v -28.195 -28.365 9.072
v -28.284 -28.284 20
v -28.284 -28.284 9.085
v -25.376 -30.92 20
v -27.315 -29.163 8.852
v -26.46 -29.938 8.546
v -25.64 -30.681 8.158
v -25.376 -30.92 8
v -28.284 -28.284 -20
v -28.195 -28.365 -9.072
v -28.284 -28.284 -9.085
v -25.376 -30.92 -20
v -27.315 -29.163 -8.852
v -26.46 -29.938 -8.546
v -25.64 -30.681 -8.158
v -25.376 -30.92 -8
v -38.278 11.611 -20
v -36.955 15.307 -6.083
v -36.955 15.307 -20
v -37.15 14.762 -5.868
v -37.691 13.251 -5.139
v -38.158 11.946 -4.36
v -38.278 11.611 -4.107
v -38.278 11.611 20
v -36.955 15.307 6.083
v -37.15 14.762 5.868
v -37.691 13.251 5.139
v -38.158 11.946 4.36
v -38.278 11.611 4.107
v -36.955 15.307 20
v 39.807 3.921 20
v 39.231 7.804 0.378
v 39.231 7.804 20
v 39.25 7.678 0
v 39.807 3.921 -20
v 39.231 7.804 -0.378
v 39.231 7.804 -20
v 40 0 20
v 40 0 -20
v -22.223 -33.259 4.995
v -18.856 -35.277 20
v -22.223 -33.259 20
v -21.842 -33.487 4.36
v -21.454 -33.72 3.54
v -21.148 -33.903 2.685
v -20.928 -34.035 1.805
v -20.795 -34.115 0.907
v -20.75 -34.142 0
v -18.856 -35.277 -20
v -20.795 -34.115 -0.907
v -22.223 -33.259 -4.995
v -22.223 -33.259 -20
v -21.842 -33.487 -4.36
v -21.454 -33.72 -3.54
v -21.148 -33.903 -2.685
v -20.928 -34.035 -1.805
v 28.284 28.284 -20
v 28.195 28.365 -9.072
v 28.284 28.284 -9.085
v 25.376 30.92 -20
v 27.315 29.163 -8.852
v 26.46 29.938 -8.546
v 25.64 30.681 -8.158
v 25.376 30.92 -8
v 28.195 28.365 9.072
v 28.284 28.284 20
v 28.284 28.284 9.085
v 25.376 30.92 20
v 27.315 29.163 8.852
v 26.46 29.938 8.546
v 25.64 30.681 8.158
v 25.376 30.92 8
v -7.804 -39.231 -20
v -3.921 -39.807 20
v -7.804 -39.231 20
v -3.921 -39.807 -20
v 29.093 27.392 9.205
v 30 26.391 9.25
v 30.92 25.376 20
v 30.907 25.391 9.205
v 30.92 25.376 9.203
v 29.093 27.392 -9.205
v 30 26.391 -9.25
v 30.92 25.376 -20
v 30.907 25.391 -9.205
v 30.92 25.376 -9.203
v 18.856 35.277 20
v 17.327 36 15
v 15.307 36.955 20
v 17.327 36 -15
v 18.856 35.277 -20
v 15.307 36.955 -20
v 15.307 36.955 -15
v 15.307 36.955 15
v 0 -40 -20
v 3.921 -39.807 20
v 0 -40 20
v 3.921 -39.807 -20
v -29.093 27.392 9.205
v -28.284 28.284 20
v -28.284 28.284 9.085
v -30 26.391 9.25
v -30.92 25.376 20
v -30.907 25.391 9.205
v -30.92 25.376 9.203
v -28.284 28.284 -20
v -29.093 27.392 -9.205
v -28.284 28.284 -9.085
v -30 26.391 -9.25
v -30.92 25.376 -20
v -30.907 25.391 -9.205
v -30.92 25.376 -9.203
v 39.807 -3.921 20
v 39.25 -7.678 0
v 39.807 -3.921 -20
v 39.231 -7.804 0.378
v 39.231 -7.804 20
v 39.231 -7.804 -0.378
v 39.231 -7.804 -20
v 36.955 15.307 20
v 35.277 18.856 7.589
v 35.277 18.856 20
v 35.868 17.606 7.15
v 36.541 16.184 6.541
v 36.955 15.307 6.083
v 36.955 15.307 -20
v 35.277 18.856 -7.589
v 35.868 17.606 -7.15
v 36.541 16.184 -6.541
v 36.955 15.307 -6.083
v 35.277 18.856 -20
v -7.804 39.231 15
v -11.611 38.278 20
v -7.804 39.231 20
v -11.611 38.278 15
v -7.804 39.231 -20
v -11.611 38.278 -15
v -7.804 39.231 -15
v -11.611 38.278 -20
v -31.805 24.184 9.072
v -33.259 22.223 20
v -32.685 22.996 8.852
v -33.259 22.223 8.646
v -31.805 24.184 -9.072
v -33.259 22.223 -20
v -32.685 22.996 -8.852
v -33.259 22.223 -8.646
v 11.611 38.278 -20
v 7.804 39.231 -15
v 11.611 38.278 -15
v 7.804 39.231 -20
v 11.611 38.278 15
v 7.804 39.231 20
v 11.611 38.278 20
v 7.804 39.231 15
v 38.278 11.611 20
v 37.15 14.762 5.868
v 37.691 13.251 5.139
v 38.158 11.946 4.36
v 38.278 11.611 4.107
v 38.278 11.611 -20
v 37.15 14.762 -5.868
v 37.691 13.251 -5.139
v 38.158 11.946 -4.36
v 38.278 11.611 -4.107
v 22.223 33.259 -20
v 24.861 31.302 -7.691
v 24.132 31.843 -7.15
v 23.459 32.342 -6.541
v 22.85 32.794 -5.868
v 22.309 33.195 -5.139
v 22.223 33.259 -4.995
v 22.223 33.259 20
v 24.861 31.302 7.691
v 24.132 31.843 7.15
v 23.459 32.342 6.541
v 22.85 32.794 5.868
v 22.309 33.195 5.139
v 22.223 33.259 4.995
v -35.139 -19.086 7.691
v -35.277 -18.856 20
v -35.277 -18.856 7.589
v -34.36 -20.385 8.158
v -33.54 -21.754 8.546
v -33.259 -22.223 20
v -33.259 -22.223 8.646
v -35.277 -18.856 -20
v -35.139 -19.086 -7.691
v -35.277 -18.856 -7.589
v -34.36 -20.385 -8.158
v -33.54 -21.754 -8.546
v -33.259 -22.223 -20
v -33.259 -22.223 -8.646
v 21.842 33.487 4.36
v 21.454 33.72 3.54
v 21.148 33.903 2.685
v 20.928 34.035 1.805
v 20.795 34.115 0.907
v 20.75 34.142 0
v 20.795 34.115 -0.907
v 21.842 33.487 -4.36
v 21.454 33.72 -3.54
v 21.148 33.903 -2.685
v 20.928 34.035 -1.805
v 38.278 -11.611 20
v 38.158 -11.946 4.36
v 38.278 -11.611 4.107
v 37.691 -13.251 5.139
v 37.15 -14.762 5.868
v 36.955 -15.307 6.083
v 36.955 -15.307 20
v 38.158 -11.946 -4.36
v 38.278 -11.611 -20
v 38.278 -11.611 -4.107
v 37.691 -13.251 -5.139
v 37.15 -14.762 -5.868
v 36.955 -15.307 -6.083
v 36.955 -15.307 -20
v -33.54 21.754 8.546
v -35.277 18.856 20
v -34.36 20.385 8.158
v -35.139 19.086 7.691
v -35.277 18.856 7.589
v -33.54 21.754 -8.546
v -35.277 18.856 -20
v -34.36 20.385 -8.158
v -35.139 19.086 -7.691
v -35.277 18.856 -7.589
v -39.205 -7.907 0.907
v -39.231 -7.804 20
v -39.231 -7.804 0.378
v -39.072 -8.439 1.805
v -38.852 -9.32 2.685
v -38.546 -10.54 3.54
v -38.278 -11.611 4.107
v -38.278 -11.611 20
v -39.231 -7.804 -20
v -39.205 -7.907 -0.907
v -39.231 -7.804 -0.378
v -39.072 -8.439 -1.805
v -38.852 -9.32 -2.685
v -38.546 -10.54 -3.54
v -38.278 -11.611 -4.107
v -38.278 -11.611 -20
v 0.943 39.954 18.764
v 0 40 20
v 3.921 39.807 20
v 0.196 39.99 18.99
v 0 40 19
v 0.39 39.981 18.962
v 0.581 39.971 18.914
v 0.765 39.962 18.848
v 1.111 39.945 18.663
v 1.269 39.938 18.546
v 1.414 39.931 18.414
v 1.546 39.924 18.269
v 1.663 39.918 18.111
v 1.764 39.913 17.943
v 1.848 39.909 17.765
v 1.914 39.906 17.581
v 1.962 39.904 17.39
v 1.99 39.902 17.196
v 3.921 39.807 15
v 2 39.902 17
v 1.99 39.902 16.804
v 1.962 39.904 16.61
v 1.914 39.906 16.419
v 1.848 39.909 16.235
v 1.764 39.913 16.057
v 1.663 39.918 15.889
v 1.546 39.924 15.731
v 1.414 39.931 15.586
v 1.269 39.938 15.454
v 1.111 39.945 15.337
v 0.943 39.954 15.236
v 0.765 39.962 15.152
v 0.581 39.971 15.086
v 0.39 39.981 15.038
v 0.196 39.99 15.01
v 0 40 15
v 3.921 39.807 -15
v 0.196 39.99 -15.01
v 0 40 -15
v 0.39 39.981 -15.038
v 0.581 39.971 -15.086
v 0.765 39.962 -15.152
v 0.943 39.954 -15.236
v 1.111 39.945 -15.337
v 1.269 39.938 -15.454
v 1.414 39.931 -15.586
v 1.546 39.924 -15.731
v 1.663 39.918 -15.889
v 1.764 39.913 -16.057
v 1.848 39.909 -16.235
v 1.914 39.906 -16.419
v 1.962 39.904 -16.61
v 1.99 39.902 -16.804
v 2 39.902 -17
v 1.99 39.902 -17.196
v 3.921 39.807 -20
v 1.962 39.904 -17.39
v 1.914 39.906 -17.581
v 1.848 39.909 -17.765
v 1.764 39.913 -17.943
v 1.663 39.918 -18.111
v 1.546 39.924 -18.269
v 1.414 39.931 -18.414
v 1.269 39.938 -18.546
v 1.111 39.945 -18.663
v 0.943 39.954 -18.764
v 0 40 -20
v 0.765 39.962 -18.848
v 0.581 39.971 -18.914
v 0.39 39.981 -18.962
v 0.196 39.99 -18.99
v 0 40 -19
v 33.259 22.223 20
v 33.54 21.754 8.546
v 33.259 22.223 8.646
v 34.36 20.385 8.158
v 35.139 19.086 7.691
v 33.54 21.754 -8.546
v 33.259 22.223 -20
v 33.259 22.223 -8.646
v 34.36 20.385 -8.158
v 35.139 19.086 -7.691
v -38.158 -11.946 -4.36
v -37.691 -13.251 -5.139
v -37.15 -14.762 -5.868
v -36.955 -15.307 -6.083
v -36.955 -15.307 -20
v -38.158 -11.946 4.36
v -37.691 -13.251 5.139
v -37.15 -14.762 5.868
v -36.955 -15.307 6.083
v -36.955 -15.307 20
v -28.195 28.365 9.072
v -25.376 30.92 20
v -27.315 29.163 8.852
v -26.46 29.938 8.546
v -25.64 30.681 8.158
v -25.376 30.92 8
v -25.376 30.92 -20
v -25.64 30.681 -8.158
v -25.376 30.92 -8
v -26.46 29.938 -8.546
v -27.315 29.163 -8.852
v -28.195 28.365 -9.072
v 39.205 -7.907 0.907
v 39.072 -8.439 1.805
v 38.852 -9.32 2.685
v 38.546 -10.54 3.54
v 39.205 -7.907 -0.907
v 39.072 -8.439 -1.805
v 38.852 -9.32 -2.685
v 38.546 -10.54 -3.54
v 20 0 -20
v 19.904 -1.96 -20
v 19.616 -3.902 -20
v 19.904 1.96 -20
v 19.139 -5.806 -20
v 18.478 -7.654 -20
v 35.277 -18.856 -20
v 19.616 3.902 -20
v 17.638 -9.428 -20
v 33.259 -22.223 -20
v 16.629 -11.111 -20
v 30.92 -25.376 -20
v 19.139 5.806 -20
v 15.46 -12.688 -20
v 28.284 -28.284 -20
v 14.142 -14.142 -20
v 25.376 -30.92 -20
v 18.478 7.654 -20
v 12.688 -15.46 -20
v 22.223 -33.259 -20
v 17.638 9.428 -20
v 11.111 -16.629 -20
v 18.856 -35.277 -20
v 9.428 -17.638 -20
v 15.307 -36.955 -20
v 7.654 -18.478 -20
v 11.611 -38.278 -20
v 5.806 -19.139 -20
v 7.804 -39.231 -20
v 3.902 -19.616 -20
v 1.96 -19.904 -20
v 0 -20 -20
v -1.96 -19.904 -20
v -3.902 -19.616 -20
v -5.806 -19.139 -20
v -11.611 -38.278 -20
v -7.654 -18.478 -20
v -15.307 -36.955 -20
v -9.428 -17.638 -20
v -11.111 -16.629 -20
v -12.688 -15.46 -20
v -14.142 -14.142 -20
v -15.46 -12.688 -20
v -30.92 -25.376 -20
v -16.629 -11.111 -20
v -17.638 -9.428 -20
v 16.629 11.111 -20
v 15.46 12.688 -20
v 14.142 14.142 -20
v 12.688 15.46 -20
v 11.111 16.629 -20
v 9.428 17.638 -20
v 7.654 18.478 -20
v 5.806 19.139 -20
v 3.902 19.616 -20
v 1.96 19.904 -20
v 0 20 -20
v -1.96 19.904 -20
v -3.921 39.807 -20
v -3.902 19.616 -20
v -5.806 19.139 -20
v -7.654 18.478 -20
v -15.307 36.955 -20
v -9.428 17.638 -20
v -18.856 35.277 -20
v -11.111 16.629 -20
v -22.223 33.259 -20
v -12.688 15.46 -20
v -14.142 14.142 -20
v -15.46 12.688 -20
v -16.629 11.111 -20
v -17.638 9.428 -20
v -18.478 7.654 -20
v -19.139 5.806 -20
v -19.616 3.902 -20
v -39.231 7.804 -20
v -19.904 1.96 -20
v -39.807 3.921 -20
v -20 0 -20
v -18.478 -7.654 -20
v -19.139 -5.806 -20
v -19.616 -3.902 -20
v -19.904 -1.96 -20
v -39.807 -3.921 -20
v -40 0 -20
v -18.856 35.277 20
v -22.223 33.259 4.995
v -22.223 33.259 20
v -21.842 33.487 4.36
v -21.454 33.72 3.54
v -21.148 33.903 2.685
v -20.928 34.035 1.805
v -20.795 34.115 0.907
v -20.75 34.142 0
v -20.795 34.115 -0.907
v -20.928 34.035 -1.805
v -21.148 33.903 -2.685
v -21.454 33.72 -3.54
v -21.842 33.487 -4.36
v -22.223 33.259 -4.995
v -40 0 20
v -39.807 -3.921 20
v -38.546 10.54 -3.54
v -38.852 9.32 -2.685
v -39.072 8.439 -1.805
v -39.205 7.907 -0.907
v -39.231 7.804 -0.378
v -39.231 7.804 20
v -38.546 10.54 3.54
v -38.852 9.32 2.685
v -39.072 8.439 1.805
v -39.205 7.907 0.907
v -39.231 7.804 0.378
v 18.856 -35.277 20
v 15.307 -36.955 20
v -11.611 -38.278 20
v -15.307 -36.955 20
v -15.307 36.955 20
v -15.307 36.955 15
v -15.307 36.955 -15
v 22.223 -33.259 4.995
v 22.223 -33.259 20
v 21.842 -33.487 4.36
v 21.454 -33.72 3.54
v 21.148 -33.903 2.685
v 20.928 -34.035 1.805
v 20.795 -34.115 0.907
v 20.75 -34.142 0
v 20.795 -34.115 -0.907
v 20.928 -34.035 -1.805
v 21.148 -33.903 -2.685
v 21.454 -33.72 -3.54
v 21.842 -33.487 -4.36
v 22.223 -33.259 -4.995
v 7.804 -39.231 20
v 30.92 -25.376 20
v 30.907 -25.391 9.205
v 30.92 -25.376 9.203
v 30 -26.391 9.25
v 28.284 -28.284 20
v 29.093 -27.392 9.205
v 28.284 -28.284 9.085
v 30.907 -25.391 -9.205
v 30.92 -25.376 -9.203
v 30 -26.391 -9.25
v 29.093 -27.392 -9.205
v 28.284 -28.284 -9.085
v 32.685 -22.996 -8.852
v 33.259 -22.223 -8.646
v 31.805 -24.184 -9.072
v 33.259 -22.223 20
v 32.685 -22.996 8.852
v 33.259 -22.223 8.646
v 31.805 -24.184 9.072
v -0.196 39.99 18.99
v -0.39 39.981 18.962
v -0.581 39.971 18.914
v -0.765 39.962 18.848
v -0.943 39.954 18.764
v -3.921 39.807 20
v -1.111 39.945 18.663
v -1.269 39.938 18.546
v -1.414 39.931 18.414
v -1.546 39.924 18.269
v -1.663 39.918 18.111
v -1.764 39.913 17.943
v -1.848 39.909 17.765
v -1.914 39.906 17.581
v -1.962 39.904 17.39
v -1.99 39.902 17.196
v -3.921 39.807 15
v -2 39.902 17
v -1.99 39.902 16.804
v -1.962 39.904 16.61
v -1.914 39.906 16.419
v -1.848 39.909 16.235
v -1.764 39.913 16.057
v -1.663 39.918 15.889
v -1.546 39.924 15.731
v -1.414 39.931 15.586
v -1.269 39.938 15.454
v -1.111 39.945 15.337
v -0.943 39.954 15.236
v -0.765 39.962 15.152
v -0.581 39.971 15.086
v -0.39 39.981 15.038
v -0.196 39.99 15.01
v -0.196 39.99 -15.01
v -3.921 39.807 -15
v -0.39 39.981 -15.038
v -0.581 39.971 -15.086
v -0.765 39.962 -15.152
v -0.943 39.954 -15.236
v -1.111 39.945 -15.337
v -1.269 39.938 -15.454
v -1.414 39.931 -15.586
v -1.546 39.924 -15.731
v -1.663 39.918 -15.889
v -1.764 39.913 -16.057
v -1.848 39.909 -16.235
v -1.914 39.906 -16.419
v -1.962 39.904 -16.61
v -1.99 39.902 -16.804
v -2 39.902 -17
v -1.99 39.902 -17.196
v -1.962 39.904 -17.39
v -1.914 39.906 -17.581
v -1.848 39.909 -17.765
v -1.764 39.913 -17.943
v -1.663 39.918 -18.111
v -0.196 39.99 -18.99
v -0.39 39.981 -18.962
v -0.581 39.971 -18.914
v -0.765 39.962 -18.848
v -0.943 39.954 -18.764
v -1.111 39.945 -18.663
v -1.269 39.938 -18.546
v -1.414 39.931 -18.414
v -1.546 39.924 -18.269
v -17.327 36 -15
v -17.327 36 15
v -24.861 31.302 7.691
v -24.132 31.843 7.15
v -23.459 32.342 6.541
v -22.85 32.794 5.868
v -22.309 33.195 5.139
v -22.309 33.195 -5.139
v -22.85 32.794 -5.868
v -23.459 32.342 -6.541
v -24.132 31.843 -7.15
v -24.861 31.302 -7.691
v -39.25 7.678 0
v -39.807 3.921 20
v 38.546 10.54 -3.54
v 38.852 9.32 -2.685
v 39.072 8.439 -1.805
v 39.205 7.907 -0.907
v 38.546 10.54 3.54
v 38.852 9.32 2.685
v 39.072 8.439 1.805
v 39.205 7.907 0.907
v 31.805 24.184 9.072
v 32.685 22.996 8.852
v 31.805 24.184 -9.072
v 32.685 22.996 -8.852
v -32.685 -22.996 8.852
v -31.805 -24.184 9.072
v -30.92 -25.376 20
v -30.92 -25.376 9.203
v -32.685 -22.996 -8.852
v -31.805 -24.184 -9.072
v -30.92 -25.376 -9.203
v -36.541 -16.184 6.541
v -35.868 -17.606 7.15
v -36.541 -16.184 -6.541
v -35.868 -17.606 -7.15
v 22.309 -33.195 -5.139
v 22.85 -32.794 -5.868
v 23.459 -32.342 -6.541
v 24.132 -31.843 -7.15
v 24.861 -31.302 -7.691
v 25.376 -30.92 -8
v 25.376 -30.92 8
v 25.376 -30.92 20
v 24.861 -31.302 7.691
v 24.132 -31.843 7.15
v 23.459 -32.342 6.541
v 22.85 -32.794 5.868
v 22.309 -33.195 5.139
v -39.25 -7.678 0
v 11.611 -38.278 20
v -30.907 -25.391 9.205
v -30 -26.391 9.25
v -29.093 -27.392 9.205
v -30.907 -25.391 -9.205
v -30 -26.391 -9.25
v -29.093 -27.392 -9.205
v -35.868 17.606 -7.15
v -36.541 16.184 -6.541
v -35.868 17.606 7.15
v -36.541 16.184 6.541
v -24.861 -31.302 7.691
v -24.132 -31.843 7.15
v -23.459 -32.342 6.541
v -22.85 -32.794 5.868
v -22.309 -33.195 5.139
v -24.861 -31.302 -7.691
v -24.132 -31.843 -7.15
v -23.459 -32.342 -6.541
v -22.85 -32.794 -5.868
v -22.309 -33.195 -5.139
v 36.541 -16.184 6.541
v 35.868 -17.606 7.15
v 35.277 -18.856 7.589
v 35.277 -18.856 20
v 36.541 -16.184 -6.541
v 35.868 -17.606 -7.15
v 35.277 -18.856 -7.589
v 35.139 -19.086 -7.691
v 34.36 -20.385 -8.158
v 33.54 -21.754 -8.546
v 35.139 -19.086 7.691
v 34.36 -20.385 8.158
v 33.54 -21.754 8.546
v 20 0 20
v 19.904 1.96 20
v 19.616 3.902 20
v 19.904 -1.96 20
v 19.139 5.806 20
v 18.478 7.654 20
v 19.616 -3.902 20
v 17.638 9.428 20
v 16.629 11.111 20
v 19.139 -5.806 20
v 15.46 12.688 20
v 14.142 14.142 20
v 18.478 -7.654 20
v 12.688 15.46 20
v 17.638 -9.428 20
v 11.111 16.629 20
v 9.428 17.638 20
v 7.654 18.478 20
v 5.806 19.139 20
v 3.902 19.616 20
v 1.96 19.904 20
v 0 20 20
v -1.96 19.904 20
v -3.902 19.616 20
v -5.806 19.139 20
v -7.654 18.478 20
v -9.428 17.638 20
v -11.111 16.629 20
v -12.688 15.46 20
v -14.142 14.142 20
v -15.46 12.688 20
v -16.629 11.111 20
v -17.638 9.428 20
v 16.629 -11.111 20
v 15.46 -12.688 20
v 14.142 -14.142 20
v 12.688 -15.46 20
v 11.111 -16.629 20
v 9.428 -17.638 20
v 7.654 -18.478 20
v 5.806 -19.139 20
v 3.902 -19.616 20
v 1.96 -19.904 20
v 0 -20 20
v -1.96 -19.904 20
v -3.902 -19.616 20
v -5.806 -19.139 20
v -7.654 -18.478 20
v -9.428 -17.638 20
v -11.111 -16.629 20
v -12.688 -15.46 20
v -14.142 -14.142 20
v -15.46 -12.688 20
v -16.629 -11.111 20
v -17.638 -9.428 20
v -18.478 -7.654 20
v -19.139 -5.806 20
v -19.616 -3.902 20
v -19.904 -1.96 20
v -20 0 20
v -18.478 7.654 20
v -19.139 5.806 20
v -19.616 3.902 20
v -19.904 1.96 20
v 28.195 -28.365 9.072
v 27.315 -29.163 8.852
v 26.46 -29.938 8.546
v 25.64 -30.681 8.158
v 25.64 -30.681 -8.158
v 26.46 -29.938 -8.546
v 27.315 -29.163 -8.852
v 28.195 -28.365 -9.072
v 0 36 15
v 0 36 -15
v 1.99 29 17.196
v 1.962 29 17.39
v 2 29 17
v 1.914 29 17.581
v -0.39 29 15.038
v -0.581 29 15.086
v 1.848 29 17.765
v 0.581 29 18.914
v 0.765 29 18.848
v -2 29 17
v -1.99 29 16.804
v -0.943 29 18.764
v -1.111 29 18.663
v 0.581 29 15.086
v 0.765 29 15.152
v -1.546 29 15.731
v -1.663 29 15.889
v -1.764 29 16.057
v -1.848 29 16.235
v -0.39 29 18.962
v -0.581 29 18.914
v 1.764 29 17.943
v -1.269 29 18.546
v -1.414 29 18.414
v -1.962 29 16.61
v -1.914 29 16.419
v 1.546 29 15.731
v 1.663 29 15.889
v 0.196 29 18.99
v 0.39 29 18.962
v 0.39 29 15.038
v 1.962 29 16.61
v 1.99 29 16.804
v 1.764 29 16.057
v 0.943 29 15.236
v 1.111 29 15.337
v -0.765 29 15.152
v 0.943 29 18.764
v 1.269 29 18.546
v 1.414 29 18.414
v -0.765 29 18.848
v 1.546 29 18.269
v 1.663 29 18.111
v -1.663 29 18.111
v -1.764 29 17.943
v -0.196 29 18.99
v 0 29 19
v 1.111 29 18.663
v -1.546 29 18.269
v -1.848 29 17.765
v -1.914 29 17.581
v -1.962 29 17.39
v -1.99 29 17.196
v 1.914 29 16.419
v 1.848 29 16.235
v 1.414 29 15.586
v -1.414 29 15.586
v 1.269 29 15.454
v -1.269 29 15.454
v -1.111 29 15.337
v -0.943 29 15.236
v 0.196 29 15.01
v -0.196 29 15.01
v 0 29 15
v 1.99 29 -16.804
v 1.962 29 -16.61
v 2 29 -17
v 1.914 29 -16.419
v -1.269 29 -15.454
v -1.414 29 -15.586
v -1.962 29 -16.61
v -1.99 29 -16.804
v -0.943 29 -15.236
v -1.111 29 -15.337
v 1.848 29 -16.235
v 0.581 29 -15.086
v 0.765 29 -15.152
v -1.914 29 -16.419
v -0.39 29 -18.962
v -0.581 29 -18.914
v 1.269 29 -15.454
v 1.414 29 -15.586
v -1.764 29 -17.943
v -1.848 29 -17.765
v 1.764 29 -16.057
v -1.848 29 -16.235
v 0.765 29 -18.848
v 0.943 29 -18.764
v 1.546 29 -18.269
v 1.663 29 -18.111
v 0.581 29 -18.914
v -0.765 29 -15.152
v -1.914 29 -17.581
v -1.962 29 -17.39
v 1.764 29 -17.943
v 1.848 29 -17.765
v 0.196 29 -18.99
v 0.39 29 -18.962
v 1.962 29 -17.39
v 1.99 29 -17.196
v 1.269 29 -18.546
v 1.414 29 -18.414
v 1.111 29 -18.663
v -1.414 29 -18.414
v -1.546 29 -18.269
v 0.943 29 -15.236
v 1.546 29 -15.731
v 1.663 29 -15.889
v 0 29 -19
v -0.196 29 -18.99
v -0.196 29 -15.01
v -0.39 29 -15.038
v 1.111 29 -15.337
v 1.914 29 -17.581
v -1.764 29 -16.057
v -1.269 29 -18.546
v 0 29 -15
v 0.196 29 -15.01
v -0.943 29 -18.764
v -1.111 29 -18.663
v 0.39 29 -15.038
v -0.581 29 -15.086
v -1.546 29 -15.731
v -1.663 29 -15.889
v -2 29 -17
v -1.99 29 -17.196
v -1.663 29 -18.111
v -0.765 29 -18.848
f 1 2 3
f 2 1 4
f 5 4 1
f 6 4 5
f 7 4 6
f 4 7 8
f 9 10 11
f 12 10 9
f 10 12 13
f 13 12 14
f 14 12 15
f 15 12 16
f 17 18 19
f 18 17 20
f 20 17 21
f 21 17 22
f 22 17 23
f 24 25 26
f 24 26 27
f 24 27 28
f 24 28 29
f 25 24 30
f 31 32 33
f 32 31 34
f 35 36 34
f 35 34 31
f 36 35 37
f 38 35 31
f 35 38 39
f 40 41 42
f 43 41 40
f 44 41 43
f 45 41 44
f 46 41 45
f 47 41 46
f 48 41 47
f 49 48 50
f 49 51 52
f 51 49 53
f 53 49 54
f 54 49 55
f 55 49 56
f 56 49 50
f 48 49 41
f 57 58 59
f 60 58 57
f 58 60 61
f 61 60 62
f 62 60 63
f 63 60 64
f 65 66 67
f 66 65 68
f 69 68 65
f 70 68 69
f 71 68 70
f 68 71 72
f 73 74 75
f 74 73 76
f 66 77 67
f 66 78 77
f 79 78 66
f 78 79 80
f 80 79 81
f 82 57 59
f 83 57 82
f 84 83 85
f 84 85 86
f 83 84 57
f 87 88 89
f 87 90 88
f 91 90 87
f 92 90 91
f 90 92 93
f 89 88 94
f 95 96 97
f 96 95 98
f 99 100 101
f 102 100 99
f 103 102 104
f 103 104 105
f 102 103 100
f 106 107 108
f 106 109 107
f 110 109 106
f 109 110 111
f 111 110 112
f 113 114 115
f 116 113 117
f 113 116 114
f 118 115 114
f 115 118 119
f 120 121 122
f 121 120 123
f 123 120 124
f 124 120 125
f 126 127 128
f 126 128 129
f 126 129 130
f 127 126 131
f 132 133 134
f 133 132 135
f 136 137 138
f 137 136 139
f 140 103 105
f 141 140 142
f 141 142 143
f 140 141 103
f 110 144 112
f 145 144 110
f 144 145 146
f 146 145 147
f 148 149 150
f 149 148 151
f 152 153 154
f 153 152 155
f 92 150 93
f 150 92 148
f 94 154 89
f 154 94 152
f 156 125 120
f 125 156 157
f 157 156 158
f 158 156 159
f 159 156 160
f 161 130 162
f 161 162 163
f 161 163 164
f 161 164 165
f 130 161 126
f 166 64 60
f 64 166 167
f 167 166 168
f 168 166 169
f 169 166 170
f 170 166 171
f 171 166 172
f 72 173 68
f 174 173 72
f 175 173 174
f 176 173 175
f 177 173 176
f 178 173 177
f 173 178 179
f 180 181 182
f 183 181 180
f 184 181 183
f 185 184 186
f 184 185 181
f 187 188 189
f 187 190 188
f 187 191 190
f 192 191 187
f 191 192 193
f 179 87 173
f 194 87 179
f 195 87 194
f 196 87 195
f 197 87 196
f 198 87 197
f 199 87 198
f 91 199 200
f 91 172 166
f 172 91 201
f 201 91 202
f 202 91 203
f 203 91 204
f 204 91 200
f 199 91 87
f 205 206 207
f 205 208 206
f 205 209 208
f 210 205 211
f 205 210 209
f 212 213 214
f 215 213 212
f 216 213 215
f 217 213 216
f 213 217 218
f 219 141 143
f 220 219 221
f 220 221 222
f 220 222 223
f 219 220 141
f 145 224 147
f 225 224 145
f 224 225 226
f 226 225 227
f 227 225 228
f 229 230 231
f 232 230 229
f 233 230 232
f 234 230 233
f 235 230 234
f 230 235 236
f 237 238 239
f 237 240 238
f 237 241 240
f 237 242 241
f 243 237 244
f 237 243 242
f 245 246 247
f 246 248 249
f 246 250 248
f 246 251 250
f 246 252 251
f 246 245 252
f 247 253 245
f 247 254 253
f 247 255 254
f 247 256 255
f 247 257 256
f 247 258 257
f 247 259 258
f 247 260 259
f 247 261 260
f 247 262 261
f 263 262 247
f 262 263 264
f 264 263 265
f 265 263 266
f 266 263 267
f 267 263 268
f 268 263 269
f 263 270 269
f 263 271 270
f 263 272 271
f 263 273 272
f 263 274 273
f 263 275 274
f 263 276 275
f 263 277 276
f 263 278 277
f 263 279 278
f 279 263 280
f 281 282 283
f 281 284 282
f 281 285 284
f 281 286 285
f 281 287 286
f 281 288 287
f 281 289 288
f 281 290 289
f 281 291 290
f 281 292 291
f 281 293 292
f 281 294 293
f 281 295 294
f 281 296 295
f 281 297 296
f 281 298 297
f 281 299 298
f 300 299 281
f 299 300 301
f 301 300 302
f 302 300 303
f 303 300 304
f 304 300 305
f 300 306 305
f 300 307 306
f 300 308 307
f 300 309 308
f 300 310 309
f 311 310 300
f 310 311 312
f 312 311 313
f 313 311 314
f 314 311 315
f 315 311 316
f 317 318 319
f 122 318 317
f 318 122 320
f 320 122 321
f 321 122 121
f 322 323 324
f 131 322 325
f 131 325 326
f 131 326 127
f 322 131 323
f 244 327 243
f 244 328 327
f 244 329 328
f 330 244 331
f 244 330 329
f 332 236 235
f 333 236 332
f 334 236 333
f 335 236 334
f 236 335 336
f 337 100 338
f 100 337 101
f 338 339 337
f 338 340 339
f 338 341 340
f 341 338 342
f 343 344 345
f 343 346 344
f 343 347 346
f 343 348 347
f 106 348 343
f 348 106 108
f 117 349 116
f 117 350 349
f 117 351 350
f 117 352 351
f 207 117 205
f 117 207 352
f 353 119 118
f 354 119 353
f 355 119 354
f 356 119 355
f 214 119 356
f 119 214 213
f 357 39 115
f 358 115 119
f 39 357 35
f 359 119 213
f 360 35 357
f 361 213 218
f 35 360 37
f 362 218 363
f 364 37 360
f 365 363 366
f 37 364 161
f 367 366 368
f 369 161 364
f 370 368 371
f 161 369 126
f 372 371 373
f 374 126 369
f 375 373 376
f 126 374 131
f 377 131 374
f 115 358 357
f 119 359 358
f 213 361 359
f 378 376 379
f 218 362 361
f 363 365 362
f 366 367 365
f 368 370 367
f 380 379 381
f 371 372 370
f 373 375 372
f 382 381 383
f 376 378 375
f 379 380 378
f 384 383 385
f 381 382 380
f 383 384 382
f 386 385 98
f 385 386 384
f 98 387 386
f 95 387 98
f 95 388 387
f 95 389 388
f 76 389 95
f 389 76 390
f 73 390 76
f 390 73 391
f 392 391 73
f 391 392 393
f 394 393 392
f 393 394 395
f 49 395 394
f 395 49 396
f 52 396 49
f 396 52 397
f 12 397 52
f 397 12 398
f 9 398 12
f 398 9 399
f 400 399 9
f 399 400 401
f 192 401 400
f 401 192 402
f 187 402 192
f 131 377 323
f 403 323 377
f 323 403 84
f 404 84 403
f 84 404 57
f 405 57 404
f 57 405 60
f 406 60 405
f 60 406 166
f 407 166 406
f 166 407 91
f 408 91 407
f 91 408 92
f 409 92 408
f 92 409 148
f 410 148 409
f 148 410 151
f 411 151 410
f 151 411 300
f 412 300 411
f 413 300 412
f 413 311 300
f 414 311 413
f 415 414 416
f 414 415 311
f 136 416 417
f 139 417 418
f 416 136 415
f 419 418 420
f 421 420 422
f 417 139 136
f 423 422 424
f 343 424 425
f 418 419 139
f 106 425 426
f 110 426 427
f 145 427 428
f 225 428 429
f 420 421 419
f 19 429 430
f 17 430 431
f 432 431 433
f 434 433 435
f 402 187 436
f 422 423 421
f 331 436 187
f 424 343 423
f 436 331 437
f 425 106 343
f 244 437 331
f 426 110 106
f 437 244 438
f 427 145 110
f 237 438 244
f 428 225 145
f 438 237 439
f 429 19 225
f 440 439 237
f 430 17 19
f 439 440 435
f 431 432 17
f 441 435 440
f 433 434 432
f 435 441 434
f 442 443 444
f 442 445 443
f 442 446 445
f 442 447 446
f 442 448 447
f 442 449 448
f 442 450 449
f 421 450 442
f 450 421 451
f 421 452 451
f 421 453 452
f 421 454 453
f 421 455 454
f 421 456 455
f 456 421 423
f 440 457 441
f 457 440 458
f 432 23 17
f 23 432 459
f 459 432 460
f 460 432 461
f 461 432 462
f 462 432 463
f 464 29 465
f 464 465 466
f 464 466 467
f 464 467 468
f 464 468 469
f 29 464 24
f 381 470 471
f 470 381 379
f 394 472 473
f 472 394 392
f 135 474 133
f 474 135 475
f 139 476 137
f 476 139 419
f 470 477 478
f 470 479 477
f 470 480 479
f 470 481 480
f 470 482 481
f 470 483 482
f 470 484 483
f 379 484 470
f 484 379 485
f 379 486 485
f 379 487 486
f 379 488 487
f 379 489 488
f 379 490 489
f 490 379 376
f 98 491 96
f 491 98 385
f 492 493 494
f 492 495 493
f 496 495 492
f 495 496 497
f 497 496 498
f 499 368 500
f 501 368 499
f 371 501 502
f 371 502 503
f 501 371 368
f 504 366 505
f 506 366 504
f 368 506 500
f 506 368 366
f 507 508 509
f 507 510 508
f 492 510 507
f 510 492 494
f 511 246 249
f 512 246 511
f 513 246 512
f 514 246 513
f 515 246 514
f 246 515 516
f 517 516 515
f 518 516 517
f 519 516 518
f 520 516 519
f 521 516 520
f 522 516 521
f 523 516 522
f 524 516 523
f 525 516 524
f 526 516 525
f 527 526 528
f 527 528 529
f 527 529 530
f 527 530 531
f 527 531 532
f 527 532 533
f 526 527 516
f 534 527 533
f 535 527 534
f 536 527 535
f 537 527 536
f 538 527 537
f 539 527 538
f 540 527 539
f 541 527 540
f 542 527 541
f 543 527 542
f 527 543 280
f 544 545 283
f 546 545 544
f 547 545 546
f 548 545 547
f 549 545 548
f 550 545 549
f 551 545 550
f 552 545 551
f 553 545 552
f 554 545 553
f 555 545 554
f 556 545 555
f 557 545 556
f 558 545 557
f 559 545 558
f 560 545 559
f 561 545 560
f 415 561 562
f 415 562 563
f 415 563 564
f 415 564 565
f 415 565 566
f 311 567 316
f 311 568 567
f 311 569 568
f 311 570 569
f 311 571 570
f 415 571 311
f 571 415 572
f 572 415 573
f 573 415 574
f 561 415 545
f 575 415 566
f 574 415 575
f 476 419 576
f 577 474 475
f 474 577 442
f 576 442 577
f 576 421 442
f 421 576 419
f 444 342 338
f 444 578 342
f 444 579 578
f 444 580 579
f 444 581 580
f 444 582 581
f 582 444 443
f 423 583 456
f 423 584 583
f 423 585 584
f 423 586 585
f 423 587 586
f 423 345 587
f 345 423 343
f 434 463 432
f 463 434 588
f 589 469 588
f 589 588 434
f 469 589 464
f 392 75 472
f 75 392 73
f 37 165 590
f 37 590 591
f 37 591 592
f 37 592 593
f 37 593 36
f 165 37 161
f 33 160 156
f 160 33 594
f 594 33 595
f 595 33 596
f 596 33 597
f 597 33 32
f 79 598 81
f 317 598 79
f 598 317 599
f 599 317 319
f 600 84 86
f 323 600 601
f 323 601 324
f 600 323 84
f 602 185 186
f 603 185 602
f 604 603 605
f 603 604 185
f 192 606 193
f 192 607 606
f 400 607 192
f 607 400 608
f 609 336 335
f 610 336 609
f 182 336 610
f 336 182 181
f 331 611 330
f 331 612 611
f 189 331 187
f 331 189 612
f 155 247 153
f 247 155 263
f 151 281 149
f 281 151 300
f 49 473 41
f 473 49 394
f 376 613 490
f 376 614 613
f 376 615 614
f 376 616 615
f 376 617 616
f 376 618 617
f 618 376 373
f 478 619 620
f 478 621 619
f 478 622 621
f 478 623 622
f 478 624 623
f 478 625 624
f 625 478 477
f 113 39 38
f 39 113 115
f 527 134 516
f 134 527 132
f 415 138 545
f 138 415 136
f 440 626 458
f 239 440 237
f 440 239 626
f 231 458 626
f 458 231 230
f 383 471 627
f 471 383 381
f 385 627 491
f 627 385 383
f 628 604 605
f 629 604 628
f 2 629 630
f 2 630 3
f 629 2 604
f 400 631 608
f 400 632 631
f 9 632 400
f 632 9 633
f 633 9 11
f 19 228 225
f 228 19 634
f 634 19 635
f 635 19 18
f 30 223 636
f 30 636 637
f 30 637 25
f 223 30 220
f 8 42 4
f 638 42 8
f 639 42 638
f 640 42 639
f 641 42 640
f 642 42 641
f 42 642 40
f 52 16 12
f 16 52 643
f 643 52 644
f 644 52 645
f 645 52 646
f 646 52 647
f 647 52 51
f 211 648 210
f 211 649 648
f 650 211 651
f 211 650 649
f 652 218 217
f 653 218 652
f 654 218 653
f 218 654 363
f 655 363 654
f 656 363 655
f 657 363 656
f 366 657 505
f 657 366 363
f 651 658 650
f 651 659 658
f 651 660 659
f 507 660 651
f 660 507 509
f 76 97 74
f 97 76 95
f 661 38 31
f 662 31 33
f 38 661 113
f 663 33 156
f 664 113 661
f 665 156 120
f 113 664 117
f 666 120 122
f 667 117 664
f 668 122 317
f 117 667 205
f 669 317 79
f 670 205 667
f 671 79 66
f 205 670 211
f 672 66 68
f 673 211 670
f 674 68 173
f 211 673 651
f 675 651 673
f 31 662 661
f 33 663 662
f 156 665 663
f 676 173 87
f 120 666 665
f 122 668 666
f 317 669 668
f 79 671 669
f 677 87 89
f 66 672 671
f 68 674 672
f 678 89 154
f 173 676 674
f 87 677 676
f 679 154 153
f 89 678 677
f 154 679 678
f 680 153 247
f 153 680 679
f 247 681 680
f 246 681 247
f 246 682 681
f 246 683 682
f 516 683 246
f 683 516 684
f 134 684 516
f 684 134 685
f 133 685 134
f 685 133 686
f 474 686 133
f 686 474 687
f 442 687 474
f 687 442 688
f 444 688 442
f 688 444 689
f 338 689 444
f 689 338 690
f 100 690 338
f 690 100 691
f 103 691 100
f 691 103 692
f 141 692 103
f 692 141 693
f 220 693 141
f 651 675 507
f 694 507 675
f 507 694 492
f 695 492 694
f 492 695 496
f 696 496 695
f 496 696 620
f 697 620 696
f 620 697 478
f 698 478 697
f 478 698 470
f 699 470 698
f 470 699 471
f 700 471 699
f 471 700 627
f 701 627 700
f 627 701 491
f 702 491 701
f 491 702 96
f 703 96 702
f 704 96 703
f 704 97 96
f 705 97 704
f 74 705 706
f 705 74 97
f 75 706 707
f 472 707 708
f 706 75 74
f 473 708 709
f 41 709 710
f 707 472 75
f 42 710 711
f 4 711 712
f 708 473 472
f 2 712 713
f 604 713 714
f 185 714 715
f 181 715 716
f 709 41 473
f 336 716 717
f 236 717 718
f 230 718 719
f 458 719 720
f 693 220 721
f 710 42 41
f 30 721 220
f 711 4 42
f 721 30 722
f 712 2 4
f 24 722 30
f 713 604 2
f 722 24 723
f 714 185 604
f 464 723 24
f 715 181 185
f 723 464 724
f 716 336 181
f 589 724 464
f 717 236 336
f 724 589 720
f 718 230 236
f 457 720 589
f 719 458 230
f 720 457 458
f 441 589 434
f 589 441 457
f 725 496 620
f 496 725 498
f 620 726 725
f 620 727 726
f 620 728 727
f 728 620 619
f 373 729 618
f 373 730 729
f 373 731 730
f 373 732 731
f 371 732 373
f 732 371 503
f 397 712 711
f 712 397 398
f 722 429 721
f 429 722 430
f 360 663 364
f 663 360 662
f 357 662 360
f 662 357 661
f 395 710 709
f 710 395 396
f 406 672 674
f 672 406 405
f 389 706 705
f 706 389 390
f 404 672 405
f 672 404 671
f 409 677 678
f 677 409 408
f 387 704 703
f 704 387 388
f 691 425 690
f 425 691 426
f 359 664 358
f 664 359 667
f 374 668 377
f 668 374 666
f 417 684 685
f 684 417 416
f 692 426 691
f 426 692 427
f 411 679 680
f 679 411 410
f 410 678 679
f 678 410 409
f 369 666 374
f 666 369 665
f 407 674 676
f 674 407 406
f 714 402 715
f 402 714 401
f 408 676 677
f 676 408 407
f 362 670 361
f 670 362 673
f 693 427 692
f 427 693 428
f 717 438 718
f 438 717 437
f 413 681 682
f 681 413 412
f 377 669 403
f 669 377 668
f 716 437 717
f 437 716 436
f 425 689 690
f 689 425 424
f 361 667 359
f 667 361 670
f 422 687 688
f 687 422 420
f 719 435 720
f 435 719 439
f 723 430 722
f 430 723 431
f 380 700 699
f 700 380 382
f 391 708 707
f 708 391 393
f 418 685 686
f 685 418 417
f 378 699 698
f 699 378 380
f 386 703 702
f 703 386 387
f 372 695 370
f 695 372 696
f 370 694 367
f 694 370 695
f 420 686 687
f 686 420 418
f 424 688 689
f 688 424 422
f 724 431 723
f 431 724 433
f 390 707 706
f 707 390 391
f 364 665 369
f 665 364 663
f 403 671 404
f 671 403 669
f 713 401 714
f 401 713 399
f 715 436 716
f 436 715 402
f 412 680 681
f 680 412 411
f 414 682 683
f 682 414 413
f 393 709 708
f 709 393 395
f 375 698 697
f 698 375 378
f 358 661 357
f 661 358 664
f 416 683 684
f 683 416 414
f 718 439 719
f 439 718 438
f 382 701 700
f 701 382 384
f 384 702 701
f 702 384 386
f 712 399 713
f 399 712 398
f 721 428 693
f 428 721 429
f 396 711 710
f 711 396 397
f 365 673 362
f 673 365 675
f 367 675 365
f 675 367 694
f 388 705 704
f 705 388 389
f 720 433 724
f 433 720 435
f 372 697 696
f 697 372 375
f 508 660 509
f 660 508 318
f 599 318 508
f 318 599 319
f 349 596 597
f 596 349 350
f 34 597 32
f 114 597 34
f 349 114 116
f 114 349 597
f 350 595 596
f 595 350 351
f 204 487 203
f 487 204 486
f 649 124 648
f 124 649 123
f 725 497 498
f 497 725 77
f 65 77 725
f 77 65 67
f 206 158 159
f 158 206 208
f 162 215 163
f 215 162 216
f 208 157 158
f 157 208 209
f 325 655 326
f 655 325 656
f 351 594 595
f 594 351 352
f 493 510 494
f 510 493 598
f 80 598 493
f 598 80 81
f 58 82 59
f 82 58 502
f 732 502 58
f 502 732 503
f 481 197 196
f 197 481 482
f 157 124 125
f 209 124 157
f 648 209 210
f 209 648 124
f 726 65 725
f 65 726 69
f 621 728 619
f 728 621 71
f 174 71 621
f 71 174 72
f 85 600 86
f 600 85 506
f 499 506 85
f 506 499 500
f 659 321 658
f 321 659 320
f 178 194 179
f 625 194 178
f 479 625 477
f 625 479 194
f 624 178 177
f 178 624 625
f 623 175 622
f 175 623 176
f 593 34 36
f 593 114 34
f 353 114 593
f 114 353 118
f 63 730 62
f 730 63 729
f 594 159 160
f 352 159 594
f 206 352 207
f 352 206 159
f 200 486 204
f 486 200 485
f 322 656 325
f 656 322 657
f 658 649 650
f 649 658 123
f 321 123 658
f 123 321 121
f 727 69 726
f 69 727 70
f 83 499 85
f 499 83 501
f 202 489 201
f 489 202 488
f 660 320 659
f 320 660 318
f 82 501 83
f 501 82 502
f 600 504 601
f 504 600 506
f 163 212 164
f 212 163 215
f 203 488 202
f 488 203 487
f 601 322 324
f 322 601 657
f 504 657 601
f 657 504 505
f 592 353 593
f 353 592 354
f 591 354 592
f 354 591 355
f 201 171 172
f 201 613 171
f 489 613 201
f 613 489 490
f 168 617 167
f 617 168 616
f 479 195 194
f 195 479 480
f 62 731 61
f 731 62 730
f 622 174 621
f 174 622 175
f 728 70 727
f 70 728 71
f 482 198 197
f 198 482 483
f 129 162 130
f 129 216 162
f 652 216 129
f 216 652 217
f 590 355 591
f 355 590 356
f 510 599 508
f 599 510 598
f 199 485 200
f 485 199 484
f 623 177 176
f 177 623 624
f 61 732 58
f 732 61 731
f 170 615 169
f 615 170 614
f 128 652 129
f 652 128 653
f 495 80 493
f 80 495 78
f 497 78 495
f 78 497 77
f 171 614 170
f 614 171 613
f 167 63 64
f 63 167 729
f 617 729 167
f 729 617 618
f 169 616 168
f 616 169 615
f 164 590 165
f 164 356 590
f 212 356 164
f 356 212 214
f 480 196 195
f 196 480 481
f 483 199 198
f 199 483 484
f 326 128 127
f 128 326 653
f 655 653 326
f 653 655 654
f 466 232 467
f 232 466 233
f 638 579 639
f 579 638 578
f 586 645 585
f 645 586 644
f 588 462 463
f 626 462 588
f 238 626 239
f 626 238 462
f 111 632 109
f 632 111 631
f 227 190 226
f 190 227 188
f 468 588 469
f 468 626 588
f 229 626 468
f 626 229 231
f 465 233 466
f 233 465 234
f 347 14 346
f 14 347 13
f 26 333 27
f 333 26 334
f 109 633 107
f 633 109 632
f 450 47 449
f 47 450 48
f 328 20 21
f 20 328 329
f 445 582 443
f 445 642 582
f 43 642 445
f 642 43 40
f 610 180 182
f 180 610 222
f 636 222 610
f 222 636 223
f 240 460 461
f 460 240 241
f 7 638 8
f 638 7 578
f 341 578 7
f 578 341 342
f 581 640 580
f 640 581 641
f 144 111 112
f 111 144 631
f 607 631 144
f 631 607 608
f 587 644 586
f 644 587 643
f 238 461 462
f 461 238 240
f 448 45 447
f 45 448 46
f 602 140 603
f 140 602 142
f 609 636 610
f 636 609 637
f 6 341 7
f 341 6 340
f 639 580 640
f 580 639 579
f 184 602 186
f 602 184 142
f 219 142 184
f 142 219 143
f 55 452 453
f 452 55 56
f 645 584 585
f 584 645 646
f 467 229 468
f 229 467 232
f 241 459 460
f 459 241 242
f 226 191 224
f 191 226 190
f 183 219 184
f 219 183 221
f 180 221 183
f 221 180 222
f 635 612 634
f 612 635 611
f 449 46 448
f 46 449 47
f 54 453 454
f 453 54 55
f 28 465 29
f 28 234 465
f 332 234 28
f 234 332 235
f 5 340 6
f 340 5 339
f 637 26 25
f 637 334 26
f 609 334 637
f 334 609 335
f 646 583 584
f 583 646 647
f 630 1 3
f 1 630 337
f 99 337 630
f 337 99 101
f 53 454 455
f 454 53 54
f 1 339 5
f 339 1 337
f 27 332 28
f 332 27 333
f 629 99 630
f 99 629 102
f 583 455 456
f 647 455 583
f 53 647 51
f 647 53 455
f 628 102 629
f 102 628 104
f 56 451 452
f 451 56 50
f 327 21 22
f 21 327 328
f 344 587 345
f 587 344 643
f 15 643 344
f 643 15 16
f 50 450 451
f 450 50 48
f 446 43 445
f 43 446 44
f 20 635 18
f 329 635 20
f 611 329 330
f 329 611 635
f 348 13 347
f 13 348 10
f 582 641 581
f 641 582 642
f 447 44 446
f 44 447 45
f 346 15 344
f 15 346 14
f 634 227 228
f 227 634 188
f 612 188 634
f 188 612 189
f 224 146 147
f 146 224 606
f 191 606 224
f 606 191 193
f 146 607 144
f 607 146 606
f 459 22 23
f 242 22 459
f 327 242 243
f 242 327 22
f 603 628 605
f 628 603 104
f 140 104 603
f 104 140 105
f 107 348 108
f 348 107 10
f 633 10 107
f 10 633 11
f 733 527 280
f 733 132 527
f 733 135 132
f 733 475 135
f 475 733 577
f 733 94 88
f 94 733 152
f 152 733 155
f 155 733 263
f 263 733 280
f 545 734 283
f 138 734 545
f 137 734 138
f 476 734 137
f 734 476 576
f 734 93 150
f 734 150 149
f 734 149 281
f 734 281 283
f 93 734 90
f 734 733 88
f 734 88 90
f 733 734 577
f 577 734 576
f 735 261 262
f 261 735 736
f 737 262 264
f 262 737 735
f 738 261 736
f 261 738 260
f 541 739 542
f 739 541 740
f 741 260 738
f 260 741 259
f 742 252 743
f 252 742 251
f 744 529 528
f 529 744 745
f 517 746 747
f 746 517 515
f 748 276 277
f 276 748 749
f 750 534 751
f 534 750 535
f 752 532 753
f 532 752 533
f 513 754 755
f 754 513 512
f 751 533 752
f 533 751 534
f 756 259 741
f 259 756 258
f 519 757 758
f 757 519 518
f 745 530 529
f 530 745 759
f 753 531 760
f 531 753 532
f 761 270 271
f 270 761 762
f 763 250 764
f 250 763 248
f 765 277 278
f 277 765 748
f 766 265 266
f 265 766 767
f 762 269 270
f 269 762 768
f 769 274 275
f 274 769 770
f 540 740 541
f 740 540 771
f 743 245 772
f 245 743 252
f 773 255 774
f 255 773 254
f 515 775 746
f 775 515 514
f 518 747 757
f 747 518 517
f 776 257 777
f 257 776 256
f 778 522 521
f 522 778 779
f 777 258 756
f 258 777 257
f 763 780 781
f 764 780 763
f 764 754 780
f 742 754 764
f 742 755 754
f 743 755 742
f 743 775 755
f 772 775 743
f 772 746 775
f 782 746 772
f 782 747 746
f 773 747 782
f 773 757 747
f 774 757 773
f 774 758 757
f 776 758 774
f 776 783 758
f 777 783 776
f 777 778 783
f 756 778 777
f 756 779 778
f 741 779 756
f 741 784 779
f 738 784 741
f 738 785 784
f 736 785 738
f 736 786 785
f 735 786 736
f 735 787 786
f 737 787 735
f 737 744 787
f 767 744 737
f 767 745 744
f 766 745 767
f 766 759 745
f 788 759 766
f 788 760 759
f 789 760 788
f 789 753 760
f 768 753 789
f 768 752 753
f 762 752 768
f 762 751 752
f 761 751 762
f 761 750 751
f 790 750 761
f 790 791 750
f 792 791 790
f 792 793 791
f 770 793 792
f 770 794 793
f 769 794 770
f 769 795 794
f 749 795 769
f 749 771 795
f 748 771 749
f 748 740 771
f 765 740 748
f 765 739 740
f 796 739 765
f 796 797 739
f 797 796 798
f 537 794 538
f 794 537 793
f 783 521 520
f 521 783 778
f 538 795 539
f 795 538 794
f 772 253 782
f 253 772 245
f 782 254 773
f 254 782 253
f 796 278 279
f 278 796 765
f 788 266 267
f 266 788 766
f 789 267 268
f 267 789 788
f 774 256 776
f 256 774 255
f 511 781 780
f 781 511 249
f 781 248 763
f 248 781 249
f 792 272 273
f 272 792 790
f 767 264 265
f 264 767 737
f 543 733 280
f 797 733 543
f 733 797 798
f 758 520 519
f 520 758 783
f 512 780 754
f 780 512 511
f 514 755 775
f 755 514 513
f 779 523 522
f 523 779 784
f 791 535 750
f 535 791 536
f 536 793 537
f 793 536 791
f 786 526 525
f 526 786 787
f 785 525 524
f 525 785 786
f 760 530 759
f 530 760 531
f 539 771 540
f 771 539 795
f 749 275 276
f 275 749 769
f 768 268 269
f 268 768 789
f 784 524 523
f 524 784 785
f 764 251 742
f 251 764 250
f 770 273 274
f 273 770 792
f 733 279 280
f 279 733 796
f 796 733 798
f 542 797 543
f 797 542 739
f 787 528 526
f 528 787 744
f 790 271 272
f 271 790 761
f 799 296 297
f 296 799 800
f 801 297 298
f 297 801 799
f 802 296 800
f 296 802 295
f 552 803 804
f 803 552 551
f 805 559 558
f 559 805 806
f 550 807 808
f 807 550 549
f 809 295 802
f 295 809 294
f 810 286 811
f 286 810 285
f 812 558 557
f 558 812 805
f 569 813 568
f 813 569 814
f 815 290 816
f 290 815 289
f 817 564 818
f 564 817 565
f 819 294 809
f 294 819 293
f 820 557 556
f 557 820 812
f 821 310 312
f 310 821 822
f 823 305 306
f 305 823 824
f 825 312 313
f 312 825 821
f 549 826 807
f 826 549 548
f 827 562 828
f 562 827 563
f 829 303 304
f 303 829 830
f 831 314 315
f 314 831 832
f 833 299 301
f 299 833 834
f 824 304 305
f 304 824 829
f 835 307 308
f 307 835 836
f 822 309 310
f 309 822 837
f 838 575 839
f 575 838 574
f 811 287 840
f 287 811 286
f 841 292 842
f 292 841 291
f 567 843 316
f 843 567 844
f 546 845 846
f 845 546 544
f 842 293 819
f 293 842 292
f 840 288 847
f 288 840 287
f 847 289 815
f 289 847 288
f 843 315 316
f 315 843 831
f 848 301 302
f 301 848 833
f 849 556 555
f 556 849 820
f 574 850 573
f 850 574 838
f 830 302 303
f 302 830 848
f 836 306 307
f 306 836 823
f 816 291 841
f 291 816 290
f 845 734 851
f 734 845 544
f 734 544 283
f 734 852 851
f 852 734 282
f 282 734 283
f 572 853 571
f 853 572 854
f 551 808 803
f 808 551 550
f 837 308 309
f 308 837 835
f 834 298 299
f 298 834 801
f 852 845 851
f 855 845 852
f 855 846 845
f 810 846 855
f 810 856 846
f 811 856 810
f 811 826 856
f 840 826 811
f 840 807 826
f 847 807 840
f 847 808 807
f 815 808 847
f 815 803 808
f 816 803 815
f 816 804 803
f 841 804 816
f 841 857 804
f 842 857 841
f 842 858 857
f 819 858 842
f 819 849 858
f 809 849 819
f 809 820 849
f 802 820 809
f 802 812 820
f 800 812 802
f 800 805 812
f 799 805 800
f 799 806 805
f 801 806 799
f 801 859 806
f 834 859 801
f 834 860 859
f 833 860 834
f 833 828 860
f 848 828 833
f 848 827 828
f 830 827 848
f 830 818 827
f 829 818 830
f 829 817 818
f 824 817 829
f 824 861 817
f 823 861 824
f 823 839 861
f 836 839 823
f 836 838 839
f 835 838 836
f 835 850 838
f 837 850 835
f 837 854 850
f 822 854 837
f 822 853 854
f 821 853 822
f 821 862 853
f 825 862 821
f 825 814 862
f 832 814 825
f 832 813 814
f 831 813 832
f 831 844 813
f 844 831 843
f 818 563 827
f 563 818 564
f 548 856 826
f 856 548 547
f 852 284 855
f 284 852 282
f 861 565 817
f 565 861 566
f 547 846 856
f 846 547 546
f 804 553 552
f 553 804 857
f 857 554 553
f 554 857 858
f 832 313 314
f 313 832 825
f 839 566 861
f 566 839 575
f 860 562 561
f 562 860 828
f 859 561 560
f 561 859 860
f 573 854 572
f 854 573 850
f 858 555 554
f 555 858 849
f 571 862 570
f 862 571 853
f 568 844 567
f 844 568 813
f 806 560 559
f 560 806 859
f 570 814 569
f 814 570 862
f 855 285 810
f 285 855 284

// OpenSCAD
// COBRA Vertebra - T1 V7
// Height: 40.0mm, OD: 80.0mm

$fn = 64;

difference() {
    // Outer cylinder
    cylinder(h=40.0, d=80.0, center=true);
    
    // Inner channel
    cylinder(h=42.0, d=40.0, center=true);

    // Battery cavity 1
    rotate([0, 0, 0])
    translate([30.0, 0, 0])
    rotate([90, 0, 0])
    cylinder(h=74.0, d=18.5, center=true);

    // Battery cavity 2
    rotate([0, 0, 180])
    translate([30.0, 0, 0])
    rotate([90, 0, 0])
    cylinder(h=74.0, d=18.5, center=true);

    // Solar panel cavity
    translate([0, 38.0, 0])
    cube([50, 4, 30], center=true);

    // Pivot holes
    translate([0, 40.0, 17.0])
    rotate([90, 0, 0])
    cylinder(h=22.0, d=4, center=true);
    
    translate([0, 40.0, -17.0])
    rotate([90, 0, 0])
    cylinder(h=22.0, d=4, center=true);
}
